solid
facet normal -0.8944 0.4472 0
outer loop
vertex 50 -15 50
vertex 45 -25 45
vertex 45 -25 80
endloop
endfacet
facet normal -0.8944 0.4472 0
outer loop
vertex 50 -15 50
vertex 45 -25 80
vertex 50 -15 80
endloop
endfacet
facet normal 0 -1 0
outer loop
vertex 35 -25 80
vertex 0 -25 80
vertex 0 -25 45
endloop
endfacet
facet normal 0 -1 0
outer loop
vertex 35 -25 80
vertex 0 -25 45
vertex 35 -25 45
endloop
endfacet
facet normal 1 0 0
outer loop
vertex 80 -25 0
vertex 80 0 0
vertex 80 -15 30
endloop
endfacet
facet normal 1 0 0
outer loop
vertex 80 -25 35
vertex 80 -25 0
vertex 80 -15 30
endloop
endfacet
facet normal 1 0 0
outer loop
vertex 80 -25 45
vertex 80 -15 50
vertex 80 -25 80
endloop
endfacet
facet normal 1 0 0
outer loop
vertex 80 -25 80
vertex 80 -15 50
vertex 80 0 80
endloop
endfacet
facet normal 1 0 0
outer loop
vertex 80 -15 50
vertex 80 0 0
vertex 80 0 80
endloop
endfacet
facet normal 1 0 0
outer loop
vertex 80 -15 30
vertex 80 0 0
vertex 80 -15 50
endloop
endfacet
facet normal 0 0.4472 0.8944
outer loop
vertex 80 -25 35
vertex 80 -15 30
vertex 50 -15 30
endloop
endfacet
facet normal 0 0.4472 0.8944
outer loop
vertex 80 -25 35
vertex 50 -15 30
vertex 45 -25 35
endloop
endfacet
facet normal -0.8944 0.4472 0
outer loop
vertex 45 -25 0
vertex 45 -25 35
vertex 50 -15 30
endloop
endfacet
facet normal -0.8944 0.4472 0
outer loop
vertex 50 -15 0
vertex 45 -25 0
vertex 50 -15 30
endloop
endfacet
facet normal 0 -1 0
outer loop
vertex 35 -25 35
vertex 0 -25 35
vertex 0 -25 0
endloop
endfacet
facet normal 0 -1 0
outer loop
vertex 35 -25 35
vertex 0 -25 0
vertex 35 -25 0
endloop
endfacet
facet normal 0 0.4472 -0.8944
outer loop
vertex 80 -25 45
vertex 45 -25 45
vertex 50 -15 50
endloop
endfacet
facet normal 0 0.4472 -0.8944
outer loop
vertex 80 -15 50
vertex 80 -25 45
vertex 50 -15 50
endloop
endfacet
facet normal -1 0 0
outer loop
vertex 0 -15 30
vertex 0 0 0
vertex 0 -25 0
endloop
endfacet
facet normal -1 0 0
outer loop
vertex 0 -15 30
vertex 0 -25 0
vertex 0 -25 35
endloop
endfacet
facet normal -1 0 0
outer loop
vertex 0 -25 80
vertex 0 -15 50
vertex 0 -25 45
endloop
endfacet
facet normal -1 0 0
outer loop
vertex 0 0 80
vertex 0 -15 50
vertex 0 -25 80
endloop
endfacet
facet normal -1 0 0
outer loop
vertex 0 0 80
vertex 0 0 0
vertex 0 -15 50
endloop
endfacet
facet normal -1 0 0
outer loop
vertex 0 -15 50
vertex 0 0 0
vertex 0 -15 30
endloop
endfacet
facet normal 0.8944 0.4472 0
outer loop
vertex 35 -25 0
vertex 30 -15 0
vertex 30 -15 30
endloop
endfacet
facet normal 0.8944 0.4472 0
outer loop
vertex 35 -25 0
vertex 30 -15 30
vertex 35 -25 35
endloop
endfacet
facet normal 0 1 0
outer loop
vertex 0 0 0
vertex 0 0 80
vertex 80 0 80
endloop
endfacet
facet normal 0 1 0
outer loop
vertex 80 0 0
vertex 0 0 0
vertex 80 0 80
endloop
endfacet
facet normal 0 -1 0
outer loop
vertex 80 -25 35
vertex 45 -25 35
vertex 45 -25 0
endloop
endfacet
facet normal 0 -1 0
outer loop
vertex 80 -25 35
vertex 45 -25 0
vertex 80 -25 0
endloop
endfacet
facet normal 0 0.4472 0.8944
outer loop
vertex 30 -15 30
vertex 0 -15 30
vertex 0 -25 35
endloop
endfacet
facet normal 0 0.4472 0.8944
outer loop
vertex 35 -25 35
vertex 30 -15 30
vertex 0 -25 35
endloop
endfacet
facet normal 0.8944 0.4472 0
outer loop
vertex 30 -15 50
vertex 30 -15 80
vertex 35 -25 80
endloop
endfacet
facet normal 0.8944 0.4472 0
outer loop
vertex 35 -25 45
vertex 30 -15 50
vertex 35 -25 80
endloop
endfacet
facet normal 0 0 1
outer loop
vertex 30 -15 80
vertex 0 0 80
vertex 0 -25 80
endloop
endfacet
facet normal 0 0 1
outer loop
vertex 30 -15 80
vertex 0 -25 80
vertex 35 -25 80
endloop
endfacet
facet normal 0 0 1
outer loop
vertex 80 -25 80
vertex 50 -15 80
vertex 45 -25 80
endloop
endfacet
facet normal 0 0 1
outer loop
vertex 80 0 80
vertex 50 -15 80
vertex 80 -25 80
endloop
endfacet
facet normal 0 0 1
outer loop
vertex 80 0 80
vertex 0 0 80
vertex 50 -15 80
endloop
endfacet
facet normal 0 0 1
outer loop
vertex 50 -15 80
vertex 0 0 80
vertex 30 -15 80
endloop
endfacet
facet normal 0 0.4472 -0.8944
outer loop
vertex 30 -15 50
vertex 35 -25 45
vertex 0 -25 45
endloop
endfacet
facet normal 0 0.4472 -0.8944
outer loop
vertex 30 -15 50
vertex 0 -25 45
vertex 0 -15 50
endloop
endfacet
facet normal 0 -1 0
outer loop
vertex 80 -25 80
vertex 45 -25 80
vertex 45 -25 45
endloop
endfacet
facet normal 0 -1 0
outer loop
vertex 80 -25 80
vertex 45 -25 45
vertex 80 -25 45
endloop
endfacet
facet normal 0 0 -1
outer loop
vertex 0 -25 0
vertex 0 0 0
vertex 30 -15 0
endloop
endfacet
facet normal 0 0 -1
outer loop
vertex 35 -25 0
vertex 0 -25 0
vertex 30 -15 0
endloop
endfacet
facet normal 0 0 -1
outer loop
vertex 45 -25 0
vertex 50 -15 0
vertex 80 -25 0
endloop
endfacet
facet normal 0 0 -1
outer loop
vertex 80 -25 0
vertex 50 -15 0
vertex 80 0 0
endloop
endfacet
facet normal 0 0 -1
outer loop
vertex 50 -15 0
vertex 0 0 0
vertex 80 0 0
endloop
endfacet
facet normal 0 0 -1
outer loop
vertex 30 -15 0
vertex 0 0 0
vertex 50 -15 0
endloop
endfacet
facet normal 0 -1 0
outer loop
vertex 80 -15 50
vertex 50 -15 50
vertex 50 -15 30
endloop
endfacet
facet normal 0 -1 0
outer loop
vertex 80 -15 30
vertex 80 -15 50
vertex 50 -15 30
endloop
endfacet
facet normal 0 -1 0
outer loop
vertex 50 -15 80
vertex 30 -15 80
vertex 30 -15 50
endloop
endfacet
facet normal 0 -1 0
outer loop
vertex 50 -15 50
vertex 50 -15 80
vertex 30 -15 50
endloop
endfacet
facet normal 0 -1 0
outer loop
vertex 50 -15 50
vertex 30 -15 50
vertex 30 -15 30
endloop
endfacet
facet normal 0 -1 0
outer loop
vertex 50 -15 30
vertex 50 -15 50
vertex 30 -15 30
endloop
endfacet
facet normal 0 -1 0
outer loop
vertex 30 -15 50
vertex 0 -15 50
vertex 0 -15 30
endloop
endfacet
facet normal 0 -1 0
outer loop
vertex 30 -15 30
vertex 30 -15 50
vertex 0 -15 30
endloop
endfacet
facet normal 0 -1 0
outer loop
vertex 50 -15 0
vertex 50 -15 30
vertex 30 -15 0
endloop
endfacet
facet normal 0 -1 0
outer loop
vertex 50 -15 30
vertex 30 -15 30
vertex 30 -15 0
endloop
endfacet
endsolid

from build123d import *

# Parameters (mm, degrees)
F0_W     = 80
F0_H     = 80
F1_DEPTH = 25
F3_DEPTH = 85
F5_DEPTH = 85


with BuildPart() as f1:
    # F0 (on Front) → F1 (new body)
    with BuildSketch(Plane.XZ):
        with Locations((40, 40)):
            Rectangle(F0_W, F0_H)
    extrude(amount=F1_DEPTH)

    # F2 (on face) → F3 (cut)
    with BuildSketch(Plane(origin=(0, 0, 0), x_dir=(0, -1, 0), z_dir=(-1, 0, 0))):
        Polygon((25, 45), (15, 50), (15, 30), (25, 35), (25, 40), align=None)
    extrude(amount=-F3_DEPTH, mode=Mode.SUBTRACT)

    # F4 (on face) → F5 (cut)
    with BuildSketch(Plane.XY.offset(80)):
        Polygon((50, -15), (30, -15), (35, -25), (40, -25), (45, -25), align=None)
    extrude(amount=-F5_DEPTH, mode=Mode.SUBTRACT)


solid = f1.part
